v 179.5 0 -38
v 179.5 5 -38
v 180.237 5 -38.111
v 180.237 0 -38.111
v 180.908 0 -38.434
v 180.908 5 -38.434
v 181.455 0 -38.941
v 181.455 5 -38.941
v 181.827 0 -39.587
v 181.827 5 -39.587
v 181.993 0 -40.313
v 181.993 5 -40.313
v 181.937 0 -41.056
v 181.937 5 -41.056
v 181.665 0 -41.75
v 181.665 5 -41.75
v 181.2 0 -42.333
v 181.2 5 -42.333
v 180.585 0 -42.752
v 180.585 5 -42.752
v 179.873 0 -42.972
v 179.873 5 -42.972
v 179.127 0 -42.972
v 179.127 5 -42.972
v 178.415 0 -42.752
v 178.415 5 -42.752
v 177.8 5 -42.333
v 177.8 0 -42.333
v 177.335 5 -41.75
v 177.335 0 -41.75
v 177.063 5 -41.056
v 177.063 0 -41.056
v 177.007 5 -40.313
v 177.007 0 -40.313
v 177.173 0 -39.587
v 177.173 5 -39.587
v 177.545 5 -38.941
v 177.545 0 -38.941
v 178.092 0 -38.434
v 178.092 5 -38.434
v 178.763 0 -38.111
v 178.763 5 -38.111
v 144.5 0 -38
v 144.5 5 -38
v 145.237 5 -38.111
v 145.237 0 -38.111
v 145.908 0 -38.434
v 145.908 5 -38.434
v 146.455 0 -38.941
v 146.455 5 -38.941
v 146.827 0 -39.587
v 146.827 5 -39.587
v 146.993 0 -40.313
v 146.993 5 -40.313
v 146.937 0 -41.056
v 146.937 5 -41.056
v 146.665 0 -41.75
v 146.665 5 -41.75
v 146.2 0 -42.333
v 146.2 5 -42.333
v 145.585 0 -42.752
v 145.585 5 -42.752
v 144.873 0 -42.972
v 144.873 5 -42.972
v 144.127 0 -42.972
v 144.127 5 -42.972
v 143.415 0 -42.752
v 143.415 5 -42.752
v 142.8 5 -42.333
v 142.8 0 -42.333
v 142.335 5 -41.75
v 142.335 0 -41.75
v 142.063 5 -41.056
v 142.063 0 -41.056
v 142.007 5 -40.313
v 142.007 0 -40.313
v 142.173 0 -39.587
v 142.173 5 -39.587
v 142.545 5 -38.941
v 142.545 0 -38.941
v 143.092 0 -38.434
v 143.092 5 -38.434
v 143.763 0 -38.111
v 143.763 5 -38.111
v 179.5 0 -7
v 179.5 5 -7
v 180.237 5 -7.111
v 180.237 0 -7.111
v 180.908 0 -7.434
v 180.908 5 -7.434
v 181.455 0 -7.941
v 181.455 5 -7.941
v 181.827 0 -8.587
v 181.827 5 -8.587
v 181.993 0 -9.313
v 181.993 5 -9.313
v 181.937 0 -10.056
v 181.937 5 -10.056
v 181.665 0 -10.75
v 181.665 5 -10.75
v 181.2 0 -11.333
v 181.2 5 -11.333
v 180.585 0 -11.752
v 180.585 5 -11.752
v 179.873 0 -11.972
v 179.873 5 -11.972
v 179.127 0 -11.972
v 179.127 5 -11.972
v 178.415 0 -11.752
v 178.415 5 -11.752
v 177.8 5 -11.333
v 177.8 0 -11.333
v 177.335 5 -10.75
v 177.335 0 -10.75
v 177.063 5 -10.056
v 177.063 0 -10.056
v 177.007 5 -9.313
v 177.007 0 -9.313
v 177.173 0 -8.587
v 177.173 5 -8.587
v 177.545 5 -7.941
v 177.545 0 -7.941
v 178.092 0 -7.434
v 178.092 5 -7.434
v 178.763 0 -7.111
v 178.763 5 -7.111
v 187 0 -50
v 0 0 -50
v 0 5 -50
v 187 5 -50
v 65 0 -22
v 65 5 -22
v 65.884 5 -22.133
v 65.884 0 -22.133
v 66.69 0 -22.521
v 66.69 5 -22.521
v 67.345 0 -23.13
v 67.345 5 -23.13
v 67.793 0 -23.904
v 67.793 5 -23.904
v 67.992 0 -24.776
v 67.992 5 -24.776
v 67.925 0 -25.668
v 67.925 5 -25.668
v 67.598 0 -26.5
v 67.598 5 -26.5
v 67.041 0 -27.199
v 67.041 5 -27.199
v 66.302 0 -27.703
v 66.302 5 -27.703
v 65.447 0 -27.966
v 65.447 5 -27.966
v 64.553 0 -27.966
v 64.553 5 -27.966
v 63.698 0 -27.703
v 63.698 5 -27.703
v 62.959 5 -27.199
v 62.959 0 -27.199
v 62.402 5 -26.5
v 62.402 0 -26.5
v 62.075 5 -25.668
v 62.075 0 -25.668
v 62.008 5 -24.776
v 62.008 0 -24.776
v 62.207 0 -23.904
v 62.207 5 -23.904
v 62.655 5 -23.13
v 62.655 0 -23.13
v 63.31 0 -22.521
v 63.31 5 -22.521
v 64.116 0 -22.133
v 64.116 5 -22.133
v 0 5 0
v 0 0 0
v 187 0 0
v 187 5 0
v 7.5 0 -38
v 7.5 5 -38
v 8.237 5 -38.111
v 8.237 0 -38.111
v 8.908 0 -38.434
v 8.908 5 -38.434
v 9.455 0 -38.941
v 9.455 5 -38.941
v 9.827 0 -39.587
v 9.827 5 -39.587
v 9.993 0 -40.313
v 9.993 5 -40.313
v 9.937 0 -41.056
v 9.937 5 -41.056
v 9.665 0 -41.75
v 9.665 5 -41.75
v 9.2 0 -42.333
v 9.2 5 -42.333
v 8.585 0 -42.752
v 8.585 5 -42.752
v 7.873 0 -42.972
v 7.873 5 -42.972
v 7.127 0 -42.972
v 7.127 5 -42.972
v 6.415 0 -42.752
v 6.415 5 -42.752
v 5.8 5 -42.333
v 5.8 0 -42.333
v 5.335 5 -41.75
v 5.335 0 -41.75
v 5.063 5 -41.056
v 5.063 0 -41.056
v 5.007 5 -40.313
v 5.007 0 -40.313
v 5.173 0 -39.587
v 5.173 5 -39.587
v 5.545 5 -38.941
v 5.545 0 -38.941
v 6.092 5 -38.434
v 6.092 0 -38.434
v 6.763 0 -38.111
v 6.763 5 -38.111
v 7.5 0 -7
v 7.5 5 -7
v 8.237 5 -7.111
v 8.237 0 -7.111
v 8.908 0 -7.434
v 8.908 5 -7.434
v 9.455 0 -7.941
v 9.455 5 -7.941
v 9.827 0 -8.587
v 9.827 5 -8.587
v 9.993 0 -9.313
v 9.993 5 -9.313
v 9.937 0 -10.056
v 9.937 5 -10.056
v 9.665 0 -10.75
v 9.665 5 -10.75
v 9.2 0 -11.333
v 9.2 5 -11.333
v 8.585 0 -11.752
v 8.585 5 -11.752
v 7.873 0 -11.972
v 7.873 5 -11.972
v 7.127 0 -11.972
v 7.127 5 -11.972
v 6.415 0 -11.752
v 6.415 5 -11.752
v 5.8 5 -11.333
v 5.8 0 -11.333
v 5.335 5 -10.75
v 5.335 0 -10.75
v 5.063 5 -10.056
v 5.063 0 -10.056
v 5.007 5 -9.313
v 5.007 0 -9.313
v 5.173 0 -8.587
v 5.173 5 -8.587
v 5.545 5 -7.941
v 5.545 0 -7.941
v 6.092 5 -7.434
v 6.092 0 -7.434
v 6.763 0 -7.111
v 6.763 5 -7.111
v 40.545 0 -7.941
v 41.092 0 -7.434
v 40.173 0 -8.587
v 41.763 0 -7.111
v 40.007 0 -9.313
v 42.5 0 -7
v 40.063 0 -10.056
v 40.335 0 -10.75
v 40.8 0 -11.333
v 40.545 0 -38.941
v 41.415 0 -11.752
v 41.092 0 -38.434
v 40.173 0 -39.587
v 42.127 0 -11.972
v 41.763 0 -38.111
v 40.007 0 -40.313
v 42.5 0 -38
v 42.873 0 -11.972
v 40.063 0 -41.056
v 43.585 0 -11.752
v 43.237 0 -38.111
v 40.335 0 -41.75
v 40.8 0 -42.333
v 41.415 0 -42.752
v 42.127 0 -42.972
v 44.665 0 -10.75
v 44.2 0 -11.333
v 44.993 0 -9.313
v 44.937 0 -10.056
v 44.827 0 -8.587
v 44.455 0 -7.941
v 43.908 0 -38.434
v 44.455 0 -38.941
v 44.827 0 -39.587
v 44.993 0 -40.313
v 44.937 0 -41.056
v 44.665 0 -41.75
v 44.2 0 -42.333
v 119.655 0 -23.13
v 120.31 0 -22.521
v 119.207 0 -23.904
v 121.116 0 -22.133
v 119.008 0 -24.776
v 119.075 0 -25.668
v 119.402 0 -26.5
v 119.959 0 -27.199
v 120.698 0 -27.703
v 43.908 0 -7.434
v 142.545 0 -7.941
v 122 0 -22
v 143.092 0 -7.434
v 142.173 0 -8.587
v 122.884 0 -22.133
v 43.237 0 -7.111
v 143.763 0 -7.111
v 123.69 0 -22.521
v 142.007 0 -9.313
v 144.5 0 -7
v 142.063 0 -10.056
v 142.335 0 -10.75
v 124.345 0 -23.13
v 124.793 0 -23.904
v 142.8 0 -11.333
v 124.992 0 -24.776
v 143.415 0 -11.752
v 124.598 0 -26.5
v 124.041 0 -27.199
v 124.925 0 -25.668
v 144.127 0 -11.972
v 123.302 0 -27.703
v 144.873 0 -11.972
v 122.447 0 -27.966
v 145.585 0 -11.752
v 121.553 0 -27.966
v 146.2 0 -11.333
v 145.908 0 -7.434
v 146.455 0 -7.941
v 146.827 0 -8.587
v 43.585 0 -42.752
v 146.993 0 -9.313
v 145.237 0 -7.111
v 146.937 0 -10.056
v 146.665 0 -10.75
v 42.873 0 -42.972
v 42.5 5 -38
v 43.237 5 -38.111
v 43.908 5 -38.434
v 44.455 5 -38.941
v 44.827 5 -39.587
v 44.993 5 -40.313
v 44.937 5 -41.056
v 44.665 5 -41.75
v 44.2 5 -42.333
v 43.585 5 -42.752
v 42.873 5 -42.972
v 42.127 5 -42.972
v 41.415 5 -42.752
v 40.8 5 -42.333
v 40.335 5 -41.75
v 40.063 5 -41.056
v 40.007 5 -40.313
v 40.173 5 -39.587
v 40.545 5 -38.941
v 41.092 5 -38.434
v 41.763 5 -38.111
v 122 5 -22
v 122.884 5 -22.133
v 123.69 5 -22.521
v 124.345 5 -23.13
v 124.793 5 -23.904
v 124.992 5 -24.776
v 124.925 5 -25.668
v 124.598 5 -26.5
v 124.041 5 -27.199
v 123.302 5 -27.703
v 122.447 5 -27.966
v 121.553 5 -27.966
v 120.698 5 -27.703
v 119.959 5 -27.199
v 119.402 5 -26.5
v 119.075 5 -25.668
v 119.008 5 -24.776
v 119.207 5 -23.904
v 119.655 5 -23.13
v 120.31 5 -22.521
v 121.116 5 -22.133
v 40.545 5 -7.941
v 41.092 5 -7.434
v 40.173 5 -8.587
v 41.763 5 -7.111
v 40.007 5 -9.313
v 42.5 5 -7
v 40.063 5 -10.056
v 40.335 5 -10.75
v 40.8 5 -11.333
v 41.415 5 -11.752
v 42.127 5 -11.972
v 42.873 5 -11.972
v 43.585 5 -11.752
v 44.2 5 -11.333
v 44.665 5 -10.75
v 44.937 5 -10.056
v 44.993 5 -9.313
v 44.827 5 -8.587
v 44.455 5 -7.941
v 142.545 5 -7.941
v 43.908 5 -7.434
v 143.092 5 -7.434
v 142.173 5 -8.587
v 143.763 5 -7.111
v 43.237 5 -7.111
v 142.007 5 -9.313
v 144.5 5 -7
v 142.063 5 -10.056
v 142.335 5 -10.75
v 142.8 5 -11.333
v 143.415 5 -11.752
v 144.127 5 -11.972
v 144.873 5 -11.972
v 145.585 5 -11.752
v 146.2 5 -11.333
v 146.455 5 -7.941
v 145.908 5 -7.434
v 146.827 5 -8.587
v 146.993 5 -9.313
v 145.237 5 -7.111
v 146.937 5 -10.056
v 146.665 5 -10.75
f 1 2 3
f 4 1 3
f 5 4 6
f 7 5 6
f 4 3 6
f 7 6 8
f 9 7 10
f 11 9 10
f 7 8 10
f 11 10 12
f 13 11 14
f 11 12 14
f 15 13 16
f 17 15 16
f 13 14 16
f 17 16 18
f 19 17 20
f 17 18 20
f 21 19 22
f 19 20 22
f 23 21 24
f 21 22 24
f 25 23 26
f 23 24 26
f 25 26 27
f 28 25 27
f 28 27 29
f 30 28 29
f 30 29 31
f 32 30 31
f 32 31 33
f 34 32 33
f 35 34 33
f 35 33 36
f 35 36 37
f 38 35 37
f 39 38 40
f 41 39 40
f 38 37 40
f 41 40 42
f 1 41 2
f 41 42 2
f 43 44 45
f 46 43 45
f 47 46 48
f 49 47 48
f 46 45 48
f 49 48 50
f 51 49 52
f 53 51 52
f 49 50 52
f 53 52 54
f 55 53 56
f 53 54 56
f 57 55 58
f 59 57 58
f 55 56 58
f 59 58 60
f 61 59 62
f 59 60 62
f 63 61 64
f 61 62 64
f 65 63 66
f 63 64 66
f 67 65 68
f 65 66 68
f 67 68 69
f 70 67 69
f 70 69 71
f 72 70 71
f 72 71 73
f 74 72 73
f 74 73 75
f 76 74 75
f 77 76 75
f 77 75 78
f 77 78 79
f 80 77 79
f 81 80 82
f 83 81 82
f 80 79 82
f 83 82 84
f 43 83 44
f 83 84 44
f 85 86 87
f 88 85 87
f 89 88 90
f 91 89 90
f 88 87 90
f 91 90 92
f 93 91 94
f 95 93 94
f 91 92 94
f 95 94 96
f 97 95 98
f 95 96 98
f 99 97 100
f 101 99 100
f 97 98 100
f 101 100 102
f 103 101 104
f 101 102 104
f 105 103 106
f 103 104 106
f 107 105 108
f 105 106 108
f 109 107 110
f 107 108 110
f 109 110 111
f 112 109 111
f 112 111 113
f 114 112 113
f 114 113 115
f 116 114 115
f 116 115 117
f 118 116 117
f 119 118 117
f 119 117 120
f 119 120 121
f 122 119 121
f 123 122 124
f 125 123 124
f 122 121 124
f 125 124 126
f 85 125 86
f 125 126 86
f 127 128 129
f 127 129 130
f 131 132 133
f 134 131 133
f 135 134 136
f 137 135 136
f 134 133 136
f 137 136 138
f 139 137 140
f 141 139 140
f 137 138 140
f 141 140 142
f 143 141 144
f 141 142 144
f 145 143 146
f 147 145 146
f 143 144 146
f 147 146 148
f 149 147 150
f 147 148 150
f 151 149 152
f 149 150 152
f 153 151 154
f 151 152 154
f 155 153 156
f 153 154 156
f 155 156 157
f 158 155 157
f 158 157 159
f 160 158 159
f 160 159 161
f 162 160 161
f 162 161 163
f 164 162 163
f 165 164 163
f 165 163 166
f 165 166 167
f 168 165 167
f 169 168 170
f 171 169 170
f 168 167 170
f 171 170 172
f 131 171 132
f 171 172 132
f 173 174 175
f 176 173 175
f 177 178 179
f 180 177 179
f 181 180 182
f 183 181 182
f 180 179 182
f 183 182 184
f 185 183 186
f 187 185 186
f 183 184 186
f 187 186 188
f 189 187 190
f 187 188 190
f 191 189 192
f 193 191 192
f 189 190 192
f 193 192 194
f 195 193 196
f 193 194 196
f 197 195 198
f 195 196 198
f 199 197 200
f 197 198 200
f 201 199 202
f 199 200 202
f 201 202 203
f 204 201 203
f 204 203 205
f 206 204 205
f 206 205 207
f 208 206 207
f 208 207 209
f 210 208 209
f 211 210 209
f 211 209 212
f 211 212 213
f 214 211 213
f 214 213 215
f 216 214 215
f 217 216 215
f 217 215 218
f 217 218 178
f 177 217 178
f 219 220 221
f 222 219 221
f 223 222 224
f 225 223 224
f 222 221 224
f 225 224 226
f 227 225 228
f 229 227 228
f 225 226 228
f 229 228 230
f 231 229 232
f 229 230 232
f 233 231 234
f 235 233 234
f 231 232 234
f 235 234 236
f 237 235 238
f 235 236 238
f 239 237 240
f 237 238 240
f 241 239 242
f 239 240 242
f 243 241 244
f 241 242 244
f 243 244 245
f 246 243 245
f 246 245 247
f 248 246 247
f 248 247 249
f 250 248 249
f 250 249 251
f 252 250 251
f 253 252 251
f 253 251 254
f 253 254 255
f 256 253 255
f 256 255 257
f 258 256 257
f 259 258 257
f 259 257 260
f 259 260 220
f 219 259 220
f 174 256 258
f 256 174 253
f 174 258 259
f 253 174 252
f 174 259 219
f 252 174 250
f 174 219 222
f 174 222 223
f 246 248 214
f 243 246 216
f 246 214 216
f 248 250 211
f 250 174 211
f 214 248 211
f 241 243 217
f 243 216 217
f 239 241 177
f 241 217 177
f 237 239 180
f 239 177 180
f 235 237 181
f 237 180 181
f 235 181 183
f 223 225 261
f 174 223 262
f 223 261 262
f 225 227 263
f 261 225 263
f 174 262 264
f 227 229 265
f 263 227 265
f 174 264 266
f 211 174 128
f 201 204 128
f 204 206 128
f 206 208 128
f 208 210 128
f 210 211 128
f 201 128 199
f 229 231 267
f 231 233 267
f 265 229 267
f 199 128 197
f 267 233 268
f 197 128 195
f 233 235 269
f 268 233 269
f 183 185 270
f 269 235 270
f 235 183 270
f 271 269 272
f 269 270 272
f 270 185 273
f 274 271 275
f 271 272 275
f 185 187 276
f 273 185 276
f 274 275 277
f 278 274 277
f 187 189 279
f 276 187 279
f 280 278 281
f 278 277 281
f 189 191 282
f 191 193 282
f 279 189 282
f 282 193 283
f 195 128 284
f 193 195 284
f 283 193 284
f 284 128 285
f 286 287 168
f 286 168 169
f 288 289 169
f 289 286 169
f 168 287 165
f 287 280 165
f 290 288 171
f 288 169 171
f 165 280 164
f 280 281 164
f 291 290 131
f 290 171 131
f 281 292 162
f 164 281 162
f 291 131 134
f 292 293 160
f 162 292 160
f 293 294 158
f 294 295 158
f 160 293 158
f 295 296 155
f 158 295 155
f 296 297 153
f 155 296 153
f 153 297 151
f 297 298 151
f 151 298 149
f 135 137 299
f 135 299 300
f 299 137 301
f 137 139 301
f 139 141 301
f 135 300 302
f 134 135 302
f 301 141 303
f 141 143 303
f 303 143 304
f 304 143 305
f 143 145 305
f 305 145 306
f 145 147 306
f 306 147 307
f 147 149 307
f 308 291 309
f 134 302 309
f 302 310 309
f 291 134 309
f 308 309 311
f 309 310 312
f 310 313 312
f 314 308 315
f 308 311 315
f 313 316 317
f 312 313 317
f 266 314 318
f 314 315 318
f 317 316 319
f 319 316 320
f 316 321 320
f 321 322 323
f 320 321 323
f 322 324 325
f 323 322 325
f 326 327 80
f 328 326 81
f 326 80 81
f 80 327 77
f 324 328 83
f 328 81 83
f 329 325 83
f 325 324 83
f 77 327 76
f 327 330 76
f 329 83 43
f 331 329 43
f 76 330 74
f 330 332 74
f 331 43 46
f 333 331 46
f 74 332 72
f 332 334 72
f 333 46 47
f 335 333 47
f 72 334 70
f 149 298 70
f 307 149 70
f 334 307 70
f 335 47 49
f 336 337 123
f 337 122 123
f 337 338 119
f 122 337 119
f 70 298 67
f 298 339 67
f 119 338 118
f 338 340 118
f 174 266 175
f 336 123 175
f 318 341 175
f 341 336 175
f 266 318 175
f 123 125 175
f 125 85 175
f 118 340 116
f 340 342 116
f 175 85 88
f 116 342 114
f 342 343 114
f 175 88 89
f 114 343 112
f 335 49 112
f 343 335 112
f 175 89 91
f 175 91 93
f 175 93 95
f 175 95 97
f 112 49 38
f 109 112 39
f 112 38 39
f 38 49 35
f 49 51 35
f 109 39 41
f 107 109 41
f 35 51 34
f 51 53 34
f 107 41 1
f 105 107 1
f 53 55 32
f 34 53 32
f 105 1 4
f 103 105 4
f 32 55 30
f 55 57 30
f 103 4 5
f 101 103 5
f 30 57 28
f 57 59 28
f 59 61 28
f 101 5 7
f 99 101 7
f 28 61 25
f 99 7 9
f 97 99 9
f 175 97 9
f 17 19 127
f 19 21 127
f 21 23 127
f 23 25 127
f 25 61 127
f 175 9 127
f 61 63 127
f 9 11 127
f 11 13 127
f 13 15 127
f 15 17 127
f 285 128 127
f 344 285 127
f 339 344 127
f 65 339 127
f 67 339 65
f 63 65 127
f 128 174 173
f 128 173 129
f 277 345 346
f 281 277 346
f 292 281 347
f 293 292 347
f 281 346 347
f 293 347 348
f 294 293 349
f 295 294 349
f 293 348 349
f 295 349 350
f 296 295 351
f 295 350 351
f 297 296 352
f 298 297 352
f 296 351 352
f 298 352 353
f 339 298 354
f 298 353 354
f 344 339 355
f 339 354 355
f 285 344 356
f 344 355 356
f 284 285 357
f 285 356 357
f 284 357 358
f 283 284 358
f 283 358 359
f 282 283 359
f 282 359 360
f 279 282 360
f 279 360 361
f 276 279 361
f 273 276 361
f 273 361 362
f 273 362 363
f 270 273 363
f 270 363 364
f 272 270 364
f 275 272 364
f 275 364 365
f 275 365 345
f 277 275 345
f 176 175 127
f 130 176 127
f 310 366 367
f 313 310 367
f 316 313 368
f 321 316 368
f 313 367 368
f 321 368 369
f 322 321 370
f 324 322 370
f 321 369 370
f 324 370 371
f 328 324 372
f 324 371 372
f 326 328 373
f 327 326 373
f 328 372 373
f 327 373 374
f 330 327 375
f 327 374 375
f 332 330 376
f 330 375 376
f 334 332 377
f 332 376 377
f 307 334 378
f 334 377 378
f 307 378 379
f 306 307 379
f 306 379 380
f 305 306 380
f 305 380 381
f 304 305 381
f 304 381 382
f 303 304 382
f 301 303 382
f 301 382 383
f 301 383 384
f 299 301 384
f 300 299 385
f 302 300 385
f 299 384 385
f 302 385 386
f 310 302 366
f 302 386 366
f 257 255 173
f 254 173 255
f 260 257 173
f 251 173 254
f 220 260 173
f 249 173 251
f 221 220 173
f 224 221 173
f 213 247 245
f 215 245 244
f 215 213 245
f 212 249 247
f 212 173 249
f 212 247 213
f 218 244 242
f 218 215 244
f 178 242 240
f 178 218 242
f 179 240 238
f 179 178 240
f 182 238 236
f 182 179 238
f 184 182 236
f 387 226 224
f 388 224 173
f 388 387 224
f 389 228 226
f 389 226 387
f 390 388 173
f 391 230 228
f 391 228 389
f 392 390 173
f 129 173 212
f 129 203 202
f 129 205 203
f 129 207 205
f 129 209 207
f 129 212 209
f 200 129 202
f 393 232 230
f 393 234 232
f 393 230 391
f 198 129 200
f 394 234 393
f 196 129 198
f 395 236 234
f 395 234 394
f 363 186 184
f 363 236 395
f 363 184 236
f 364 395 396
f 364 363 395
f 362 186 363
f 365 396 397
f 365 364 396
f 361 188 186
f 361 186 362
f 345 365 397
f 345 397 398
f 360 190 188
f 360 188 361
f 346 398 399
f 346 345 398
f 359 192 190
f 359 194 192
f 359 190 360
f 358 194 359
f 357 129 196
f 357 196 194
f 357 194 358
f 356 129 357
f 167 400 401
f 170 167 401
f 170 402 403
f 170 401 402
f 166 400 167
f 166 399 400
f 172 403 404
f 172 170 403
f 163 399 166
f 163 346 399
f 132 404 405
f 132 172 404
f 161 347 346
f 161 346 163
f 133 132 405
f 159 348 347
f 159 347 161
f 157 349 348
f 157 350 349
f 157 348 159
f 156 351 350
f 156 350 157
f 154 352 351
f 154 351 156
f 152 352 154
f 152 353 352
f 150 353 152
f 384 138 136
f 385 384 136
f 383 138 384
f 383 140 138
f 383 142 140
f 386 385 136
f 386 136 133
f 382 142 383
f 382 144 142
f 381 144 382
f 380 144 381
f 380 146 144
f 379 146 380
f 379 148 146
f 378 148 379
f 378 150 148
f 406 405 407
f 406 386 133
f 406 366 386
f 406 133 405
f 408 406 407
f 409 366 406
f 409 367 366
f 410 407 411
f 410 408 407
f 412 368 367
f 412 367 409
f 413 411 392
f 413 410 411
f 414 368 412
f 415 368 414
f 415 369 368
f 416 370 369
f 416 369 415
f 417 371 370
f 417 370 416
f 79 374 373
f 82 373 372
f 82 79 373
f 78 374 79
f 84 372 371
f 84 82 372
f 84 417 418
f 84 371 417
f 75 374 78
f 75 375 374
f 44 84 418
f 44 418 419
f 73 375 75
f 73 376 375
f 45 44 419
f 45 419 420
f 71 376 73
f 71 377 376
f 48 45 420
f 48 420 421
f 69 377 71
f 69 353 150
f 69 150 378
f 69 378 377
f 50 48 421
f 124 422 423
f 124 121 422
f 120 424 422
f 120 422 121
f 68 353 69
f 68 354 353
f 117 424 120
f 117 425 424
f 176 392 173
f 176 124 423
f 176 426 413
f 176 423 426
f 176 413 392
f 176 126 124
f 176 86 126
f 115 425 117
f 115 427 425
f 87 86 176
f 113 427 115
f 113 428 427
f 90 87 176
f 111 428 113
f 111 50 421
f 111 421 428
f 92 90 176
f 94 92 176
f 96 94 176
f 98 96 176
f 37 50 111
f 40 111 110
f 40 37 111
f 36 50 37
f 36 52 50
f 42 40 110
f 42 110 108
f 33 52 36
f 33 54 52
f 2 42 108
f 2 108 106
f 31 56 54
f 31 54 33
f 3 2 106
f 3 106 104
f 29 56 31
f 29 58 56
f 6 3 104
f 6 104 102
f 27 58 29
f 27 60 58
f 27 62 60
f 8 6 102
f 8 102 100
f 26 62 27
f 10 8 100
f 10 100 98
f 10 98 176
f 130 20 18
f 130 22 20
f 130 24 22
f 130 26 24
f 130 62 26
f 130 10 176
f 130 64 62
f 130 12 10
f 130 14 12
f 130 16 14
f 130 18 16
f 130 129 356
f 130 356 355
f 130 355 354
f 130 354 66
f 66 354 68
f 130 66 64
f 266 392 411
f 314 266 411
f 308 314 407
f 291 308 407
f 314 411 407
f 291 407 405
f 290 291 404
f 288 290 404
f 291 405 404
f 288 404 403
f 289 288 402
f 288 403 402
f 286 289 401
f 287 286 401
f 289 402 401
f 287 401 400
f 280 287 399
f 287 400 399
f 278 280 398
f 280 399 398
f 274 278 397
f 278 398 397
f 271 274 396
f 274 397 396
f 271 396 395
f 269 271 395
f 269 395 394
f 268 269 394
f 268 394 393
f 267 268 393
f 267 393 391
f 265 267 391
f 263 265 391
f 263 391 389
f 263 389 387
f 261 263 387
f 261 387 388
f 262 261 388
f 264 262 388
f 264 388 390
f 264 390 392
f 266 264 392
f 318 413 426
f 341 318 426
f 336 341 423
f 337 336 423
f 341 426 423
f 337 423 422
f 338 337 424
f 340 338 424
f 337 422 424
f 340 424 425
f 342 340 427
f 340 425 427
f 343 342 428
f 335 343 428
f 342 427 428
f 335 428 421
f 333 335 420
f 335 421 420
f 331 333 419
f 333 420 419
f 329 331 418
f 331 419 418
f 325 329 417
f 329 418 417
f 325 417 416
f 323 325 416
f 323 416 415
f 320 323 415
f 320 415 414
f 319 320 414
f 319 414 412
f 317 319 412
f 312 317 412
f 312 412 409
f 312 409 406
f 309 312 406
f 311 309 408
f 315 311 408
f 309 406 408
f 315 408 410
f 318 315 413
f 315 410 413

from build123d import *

# Parameters (mm, degrees)
SKETCH1_W           = 187
SKETCH1_H           = 50
BOSS_EXTRUDE1_DEPTH = 5
SKETCH2_R           = 3
CUT_EXTRUDE1_DEPTH  = 5
SKETCH3_R           = 2.5
CUT_EXTRUDE2_DEPTH  = 5
SKETCH4_R           = 2.5
CUT_EXTRUDE3_DEPTH  = 25
SKETCH5_R           = 2.5
CUT_EXTRUDE4_DEPTH  = 25


with BuildPart() as part:
    # Sketch1 → Boss-Extrude1 (new body)
    with BuildSketch(Plane(origin=(0, 0, 0), x_dir=(1, 0, 0), z_dir=(0, 1, 0))):
        with Locations((93.5, 25)):
            Rectangle(SKETCH1_W, SKETCH1_H)
    extrude(amount=BOSS_EXTRUDE1_DEPTH)

    # Sketch2 → Cut-Extrude1 (cut)
    with BuildSketch(Plane(origin=(0, 5, 0), x_dir=(1, 0, 0), z_dir=(0, 1, 0))):
        with Locations(Location((65, 25, 0), (0, 0, 270))):
            Circle(SKETCH2_R)
        with Locations(Location((122, 25, 0), (0, 0, 270))):
            Circle(SKETCH2_R)
    extrude(amount=-CUT_EXTRUDE1_DEPTH, mode=Mode.SUBTRACT)

    # Sketch3 → Cut-Extrude2 (cut)
    with BuildSketch(Plane(origin=(0, 5, 0), x_dir=(1, 0, 0), z_dir=(0, 1, 0))):
        with Locations(Location((144.5, 40.5, 0), (0, 0, 270))):
            Circle(SKETCH3_R)
        with Locations(Location((144.5, 9.5, 0), (0, 0, 270))):
            Circle(SKETCH3_R)
        with Locations(Location((179.5, 9.5, 0), (0, 0, 270))):
            Circle(SKETCH3_R)
        with Locations(Location((179.5, 40.5, 0), (0, 0, 270))):
            Circle(SKETCH3_R)
    extrude(amount=-CUT_EXTRUDE2_DEPTH, mode=Mode.SUBTRACT)

    # Sketch4 → Cut-Extrude3 (cut)
    with BuildSketch(Plane(origin=(0, 5, 0), x_dir=(1, 0, 0), z_dir=(0, 1, 0))):
        with Locations(Location((7.5, 40.5, 0), (0, 0, 270))):
            Circle(SKETCH4_R)
    extrude(amount=-CUT_EXTRUDE3_DEPTH, mode=Mode.SUBTRACT)

    # Sketch5 → Cut-Extrude4 (cut)
    with BuildSketch(Plane(origin=(0, 5, 0), x_dir=(1, 0, 0), z_dir=(0, 1, 0))):
        with Locations(Location((42.5, 9.5, 0), (0, 0, 270))):
            Circle(SKETCH5_R)
        with Locations(Location((7.5, 9.5, 0), (0, 0, 270))):
            Circle(SKETCH5_R)
        with Locations(Location((42.5, 40.5, 0), (0, 0, 270))):
            Circle(SKETCH5_R)
    extrude(amount=-CUT_EXTRUDE4_DEPTH, mode=Mode.SUBTRACT)


solid = part.part
